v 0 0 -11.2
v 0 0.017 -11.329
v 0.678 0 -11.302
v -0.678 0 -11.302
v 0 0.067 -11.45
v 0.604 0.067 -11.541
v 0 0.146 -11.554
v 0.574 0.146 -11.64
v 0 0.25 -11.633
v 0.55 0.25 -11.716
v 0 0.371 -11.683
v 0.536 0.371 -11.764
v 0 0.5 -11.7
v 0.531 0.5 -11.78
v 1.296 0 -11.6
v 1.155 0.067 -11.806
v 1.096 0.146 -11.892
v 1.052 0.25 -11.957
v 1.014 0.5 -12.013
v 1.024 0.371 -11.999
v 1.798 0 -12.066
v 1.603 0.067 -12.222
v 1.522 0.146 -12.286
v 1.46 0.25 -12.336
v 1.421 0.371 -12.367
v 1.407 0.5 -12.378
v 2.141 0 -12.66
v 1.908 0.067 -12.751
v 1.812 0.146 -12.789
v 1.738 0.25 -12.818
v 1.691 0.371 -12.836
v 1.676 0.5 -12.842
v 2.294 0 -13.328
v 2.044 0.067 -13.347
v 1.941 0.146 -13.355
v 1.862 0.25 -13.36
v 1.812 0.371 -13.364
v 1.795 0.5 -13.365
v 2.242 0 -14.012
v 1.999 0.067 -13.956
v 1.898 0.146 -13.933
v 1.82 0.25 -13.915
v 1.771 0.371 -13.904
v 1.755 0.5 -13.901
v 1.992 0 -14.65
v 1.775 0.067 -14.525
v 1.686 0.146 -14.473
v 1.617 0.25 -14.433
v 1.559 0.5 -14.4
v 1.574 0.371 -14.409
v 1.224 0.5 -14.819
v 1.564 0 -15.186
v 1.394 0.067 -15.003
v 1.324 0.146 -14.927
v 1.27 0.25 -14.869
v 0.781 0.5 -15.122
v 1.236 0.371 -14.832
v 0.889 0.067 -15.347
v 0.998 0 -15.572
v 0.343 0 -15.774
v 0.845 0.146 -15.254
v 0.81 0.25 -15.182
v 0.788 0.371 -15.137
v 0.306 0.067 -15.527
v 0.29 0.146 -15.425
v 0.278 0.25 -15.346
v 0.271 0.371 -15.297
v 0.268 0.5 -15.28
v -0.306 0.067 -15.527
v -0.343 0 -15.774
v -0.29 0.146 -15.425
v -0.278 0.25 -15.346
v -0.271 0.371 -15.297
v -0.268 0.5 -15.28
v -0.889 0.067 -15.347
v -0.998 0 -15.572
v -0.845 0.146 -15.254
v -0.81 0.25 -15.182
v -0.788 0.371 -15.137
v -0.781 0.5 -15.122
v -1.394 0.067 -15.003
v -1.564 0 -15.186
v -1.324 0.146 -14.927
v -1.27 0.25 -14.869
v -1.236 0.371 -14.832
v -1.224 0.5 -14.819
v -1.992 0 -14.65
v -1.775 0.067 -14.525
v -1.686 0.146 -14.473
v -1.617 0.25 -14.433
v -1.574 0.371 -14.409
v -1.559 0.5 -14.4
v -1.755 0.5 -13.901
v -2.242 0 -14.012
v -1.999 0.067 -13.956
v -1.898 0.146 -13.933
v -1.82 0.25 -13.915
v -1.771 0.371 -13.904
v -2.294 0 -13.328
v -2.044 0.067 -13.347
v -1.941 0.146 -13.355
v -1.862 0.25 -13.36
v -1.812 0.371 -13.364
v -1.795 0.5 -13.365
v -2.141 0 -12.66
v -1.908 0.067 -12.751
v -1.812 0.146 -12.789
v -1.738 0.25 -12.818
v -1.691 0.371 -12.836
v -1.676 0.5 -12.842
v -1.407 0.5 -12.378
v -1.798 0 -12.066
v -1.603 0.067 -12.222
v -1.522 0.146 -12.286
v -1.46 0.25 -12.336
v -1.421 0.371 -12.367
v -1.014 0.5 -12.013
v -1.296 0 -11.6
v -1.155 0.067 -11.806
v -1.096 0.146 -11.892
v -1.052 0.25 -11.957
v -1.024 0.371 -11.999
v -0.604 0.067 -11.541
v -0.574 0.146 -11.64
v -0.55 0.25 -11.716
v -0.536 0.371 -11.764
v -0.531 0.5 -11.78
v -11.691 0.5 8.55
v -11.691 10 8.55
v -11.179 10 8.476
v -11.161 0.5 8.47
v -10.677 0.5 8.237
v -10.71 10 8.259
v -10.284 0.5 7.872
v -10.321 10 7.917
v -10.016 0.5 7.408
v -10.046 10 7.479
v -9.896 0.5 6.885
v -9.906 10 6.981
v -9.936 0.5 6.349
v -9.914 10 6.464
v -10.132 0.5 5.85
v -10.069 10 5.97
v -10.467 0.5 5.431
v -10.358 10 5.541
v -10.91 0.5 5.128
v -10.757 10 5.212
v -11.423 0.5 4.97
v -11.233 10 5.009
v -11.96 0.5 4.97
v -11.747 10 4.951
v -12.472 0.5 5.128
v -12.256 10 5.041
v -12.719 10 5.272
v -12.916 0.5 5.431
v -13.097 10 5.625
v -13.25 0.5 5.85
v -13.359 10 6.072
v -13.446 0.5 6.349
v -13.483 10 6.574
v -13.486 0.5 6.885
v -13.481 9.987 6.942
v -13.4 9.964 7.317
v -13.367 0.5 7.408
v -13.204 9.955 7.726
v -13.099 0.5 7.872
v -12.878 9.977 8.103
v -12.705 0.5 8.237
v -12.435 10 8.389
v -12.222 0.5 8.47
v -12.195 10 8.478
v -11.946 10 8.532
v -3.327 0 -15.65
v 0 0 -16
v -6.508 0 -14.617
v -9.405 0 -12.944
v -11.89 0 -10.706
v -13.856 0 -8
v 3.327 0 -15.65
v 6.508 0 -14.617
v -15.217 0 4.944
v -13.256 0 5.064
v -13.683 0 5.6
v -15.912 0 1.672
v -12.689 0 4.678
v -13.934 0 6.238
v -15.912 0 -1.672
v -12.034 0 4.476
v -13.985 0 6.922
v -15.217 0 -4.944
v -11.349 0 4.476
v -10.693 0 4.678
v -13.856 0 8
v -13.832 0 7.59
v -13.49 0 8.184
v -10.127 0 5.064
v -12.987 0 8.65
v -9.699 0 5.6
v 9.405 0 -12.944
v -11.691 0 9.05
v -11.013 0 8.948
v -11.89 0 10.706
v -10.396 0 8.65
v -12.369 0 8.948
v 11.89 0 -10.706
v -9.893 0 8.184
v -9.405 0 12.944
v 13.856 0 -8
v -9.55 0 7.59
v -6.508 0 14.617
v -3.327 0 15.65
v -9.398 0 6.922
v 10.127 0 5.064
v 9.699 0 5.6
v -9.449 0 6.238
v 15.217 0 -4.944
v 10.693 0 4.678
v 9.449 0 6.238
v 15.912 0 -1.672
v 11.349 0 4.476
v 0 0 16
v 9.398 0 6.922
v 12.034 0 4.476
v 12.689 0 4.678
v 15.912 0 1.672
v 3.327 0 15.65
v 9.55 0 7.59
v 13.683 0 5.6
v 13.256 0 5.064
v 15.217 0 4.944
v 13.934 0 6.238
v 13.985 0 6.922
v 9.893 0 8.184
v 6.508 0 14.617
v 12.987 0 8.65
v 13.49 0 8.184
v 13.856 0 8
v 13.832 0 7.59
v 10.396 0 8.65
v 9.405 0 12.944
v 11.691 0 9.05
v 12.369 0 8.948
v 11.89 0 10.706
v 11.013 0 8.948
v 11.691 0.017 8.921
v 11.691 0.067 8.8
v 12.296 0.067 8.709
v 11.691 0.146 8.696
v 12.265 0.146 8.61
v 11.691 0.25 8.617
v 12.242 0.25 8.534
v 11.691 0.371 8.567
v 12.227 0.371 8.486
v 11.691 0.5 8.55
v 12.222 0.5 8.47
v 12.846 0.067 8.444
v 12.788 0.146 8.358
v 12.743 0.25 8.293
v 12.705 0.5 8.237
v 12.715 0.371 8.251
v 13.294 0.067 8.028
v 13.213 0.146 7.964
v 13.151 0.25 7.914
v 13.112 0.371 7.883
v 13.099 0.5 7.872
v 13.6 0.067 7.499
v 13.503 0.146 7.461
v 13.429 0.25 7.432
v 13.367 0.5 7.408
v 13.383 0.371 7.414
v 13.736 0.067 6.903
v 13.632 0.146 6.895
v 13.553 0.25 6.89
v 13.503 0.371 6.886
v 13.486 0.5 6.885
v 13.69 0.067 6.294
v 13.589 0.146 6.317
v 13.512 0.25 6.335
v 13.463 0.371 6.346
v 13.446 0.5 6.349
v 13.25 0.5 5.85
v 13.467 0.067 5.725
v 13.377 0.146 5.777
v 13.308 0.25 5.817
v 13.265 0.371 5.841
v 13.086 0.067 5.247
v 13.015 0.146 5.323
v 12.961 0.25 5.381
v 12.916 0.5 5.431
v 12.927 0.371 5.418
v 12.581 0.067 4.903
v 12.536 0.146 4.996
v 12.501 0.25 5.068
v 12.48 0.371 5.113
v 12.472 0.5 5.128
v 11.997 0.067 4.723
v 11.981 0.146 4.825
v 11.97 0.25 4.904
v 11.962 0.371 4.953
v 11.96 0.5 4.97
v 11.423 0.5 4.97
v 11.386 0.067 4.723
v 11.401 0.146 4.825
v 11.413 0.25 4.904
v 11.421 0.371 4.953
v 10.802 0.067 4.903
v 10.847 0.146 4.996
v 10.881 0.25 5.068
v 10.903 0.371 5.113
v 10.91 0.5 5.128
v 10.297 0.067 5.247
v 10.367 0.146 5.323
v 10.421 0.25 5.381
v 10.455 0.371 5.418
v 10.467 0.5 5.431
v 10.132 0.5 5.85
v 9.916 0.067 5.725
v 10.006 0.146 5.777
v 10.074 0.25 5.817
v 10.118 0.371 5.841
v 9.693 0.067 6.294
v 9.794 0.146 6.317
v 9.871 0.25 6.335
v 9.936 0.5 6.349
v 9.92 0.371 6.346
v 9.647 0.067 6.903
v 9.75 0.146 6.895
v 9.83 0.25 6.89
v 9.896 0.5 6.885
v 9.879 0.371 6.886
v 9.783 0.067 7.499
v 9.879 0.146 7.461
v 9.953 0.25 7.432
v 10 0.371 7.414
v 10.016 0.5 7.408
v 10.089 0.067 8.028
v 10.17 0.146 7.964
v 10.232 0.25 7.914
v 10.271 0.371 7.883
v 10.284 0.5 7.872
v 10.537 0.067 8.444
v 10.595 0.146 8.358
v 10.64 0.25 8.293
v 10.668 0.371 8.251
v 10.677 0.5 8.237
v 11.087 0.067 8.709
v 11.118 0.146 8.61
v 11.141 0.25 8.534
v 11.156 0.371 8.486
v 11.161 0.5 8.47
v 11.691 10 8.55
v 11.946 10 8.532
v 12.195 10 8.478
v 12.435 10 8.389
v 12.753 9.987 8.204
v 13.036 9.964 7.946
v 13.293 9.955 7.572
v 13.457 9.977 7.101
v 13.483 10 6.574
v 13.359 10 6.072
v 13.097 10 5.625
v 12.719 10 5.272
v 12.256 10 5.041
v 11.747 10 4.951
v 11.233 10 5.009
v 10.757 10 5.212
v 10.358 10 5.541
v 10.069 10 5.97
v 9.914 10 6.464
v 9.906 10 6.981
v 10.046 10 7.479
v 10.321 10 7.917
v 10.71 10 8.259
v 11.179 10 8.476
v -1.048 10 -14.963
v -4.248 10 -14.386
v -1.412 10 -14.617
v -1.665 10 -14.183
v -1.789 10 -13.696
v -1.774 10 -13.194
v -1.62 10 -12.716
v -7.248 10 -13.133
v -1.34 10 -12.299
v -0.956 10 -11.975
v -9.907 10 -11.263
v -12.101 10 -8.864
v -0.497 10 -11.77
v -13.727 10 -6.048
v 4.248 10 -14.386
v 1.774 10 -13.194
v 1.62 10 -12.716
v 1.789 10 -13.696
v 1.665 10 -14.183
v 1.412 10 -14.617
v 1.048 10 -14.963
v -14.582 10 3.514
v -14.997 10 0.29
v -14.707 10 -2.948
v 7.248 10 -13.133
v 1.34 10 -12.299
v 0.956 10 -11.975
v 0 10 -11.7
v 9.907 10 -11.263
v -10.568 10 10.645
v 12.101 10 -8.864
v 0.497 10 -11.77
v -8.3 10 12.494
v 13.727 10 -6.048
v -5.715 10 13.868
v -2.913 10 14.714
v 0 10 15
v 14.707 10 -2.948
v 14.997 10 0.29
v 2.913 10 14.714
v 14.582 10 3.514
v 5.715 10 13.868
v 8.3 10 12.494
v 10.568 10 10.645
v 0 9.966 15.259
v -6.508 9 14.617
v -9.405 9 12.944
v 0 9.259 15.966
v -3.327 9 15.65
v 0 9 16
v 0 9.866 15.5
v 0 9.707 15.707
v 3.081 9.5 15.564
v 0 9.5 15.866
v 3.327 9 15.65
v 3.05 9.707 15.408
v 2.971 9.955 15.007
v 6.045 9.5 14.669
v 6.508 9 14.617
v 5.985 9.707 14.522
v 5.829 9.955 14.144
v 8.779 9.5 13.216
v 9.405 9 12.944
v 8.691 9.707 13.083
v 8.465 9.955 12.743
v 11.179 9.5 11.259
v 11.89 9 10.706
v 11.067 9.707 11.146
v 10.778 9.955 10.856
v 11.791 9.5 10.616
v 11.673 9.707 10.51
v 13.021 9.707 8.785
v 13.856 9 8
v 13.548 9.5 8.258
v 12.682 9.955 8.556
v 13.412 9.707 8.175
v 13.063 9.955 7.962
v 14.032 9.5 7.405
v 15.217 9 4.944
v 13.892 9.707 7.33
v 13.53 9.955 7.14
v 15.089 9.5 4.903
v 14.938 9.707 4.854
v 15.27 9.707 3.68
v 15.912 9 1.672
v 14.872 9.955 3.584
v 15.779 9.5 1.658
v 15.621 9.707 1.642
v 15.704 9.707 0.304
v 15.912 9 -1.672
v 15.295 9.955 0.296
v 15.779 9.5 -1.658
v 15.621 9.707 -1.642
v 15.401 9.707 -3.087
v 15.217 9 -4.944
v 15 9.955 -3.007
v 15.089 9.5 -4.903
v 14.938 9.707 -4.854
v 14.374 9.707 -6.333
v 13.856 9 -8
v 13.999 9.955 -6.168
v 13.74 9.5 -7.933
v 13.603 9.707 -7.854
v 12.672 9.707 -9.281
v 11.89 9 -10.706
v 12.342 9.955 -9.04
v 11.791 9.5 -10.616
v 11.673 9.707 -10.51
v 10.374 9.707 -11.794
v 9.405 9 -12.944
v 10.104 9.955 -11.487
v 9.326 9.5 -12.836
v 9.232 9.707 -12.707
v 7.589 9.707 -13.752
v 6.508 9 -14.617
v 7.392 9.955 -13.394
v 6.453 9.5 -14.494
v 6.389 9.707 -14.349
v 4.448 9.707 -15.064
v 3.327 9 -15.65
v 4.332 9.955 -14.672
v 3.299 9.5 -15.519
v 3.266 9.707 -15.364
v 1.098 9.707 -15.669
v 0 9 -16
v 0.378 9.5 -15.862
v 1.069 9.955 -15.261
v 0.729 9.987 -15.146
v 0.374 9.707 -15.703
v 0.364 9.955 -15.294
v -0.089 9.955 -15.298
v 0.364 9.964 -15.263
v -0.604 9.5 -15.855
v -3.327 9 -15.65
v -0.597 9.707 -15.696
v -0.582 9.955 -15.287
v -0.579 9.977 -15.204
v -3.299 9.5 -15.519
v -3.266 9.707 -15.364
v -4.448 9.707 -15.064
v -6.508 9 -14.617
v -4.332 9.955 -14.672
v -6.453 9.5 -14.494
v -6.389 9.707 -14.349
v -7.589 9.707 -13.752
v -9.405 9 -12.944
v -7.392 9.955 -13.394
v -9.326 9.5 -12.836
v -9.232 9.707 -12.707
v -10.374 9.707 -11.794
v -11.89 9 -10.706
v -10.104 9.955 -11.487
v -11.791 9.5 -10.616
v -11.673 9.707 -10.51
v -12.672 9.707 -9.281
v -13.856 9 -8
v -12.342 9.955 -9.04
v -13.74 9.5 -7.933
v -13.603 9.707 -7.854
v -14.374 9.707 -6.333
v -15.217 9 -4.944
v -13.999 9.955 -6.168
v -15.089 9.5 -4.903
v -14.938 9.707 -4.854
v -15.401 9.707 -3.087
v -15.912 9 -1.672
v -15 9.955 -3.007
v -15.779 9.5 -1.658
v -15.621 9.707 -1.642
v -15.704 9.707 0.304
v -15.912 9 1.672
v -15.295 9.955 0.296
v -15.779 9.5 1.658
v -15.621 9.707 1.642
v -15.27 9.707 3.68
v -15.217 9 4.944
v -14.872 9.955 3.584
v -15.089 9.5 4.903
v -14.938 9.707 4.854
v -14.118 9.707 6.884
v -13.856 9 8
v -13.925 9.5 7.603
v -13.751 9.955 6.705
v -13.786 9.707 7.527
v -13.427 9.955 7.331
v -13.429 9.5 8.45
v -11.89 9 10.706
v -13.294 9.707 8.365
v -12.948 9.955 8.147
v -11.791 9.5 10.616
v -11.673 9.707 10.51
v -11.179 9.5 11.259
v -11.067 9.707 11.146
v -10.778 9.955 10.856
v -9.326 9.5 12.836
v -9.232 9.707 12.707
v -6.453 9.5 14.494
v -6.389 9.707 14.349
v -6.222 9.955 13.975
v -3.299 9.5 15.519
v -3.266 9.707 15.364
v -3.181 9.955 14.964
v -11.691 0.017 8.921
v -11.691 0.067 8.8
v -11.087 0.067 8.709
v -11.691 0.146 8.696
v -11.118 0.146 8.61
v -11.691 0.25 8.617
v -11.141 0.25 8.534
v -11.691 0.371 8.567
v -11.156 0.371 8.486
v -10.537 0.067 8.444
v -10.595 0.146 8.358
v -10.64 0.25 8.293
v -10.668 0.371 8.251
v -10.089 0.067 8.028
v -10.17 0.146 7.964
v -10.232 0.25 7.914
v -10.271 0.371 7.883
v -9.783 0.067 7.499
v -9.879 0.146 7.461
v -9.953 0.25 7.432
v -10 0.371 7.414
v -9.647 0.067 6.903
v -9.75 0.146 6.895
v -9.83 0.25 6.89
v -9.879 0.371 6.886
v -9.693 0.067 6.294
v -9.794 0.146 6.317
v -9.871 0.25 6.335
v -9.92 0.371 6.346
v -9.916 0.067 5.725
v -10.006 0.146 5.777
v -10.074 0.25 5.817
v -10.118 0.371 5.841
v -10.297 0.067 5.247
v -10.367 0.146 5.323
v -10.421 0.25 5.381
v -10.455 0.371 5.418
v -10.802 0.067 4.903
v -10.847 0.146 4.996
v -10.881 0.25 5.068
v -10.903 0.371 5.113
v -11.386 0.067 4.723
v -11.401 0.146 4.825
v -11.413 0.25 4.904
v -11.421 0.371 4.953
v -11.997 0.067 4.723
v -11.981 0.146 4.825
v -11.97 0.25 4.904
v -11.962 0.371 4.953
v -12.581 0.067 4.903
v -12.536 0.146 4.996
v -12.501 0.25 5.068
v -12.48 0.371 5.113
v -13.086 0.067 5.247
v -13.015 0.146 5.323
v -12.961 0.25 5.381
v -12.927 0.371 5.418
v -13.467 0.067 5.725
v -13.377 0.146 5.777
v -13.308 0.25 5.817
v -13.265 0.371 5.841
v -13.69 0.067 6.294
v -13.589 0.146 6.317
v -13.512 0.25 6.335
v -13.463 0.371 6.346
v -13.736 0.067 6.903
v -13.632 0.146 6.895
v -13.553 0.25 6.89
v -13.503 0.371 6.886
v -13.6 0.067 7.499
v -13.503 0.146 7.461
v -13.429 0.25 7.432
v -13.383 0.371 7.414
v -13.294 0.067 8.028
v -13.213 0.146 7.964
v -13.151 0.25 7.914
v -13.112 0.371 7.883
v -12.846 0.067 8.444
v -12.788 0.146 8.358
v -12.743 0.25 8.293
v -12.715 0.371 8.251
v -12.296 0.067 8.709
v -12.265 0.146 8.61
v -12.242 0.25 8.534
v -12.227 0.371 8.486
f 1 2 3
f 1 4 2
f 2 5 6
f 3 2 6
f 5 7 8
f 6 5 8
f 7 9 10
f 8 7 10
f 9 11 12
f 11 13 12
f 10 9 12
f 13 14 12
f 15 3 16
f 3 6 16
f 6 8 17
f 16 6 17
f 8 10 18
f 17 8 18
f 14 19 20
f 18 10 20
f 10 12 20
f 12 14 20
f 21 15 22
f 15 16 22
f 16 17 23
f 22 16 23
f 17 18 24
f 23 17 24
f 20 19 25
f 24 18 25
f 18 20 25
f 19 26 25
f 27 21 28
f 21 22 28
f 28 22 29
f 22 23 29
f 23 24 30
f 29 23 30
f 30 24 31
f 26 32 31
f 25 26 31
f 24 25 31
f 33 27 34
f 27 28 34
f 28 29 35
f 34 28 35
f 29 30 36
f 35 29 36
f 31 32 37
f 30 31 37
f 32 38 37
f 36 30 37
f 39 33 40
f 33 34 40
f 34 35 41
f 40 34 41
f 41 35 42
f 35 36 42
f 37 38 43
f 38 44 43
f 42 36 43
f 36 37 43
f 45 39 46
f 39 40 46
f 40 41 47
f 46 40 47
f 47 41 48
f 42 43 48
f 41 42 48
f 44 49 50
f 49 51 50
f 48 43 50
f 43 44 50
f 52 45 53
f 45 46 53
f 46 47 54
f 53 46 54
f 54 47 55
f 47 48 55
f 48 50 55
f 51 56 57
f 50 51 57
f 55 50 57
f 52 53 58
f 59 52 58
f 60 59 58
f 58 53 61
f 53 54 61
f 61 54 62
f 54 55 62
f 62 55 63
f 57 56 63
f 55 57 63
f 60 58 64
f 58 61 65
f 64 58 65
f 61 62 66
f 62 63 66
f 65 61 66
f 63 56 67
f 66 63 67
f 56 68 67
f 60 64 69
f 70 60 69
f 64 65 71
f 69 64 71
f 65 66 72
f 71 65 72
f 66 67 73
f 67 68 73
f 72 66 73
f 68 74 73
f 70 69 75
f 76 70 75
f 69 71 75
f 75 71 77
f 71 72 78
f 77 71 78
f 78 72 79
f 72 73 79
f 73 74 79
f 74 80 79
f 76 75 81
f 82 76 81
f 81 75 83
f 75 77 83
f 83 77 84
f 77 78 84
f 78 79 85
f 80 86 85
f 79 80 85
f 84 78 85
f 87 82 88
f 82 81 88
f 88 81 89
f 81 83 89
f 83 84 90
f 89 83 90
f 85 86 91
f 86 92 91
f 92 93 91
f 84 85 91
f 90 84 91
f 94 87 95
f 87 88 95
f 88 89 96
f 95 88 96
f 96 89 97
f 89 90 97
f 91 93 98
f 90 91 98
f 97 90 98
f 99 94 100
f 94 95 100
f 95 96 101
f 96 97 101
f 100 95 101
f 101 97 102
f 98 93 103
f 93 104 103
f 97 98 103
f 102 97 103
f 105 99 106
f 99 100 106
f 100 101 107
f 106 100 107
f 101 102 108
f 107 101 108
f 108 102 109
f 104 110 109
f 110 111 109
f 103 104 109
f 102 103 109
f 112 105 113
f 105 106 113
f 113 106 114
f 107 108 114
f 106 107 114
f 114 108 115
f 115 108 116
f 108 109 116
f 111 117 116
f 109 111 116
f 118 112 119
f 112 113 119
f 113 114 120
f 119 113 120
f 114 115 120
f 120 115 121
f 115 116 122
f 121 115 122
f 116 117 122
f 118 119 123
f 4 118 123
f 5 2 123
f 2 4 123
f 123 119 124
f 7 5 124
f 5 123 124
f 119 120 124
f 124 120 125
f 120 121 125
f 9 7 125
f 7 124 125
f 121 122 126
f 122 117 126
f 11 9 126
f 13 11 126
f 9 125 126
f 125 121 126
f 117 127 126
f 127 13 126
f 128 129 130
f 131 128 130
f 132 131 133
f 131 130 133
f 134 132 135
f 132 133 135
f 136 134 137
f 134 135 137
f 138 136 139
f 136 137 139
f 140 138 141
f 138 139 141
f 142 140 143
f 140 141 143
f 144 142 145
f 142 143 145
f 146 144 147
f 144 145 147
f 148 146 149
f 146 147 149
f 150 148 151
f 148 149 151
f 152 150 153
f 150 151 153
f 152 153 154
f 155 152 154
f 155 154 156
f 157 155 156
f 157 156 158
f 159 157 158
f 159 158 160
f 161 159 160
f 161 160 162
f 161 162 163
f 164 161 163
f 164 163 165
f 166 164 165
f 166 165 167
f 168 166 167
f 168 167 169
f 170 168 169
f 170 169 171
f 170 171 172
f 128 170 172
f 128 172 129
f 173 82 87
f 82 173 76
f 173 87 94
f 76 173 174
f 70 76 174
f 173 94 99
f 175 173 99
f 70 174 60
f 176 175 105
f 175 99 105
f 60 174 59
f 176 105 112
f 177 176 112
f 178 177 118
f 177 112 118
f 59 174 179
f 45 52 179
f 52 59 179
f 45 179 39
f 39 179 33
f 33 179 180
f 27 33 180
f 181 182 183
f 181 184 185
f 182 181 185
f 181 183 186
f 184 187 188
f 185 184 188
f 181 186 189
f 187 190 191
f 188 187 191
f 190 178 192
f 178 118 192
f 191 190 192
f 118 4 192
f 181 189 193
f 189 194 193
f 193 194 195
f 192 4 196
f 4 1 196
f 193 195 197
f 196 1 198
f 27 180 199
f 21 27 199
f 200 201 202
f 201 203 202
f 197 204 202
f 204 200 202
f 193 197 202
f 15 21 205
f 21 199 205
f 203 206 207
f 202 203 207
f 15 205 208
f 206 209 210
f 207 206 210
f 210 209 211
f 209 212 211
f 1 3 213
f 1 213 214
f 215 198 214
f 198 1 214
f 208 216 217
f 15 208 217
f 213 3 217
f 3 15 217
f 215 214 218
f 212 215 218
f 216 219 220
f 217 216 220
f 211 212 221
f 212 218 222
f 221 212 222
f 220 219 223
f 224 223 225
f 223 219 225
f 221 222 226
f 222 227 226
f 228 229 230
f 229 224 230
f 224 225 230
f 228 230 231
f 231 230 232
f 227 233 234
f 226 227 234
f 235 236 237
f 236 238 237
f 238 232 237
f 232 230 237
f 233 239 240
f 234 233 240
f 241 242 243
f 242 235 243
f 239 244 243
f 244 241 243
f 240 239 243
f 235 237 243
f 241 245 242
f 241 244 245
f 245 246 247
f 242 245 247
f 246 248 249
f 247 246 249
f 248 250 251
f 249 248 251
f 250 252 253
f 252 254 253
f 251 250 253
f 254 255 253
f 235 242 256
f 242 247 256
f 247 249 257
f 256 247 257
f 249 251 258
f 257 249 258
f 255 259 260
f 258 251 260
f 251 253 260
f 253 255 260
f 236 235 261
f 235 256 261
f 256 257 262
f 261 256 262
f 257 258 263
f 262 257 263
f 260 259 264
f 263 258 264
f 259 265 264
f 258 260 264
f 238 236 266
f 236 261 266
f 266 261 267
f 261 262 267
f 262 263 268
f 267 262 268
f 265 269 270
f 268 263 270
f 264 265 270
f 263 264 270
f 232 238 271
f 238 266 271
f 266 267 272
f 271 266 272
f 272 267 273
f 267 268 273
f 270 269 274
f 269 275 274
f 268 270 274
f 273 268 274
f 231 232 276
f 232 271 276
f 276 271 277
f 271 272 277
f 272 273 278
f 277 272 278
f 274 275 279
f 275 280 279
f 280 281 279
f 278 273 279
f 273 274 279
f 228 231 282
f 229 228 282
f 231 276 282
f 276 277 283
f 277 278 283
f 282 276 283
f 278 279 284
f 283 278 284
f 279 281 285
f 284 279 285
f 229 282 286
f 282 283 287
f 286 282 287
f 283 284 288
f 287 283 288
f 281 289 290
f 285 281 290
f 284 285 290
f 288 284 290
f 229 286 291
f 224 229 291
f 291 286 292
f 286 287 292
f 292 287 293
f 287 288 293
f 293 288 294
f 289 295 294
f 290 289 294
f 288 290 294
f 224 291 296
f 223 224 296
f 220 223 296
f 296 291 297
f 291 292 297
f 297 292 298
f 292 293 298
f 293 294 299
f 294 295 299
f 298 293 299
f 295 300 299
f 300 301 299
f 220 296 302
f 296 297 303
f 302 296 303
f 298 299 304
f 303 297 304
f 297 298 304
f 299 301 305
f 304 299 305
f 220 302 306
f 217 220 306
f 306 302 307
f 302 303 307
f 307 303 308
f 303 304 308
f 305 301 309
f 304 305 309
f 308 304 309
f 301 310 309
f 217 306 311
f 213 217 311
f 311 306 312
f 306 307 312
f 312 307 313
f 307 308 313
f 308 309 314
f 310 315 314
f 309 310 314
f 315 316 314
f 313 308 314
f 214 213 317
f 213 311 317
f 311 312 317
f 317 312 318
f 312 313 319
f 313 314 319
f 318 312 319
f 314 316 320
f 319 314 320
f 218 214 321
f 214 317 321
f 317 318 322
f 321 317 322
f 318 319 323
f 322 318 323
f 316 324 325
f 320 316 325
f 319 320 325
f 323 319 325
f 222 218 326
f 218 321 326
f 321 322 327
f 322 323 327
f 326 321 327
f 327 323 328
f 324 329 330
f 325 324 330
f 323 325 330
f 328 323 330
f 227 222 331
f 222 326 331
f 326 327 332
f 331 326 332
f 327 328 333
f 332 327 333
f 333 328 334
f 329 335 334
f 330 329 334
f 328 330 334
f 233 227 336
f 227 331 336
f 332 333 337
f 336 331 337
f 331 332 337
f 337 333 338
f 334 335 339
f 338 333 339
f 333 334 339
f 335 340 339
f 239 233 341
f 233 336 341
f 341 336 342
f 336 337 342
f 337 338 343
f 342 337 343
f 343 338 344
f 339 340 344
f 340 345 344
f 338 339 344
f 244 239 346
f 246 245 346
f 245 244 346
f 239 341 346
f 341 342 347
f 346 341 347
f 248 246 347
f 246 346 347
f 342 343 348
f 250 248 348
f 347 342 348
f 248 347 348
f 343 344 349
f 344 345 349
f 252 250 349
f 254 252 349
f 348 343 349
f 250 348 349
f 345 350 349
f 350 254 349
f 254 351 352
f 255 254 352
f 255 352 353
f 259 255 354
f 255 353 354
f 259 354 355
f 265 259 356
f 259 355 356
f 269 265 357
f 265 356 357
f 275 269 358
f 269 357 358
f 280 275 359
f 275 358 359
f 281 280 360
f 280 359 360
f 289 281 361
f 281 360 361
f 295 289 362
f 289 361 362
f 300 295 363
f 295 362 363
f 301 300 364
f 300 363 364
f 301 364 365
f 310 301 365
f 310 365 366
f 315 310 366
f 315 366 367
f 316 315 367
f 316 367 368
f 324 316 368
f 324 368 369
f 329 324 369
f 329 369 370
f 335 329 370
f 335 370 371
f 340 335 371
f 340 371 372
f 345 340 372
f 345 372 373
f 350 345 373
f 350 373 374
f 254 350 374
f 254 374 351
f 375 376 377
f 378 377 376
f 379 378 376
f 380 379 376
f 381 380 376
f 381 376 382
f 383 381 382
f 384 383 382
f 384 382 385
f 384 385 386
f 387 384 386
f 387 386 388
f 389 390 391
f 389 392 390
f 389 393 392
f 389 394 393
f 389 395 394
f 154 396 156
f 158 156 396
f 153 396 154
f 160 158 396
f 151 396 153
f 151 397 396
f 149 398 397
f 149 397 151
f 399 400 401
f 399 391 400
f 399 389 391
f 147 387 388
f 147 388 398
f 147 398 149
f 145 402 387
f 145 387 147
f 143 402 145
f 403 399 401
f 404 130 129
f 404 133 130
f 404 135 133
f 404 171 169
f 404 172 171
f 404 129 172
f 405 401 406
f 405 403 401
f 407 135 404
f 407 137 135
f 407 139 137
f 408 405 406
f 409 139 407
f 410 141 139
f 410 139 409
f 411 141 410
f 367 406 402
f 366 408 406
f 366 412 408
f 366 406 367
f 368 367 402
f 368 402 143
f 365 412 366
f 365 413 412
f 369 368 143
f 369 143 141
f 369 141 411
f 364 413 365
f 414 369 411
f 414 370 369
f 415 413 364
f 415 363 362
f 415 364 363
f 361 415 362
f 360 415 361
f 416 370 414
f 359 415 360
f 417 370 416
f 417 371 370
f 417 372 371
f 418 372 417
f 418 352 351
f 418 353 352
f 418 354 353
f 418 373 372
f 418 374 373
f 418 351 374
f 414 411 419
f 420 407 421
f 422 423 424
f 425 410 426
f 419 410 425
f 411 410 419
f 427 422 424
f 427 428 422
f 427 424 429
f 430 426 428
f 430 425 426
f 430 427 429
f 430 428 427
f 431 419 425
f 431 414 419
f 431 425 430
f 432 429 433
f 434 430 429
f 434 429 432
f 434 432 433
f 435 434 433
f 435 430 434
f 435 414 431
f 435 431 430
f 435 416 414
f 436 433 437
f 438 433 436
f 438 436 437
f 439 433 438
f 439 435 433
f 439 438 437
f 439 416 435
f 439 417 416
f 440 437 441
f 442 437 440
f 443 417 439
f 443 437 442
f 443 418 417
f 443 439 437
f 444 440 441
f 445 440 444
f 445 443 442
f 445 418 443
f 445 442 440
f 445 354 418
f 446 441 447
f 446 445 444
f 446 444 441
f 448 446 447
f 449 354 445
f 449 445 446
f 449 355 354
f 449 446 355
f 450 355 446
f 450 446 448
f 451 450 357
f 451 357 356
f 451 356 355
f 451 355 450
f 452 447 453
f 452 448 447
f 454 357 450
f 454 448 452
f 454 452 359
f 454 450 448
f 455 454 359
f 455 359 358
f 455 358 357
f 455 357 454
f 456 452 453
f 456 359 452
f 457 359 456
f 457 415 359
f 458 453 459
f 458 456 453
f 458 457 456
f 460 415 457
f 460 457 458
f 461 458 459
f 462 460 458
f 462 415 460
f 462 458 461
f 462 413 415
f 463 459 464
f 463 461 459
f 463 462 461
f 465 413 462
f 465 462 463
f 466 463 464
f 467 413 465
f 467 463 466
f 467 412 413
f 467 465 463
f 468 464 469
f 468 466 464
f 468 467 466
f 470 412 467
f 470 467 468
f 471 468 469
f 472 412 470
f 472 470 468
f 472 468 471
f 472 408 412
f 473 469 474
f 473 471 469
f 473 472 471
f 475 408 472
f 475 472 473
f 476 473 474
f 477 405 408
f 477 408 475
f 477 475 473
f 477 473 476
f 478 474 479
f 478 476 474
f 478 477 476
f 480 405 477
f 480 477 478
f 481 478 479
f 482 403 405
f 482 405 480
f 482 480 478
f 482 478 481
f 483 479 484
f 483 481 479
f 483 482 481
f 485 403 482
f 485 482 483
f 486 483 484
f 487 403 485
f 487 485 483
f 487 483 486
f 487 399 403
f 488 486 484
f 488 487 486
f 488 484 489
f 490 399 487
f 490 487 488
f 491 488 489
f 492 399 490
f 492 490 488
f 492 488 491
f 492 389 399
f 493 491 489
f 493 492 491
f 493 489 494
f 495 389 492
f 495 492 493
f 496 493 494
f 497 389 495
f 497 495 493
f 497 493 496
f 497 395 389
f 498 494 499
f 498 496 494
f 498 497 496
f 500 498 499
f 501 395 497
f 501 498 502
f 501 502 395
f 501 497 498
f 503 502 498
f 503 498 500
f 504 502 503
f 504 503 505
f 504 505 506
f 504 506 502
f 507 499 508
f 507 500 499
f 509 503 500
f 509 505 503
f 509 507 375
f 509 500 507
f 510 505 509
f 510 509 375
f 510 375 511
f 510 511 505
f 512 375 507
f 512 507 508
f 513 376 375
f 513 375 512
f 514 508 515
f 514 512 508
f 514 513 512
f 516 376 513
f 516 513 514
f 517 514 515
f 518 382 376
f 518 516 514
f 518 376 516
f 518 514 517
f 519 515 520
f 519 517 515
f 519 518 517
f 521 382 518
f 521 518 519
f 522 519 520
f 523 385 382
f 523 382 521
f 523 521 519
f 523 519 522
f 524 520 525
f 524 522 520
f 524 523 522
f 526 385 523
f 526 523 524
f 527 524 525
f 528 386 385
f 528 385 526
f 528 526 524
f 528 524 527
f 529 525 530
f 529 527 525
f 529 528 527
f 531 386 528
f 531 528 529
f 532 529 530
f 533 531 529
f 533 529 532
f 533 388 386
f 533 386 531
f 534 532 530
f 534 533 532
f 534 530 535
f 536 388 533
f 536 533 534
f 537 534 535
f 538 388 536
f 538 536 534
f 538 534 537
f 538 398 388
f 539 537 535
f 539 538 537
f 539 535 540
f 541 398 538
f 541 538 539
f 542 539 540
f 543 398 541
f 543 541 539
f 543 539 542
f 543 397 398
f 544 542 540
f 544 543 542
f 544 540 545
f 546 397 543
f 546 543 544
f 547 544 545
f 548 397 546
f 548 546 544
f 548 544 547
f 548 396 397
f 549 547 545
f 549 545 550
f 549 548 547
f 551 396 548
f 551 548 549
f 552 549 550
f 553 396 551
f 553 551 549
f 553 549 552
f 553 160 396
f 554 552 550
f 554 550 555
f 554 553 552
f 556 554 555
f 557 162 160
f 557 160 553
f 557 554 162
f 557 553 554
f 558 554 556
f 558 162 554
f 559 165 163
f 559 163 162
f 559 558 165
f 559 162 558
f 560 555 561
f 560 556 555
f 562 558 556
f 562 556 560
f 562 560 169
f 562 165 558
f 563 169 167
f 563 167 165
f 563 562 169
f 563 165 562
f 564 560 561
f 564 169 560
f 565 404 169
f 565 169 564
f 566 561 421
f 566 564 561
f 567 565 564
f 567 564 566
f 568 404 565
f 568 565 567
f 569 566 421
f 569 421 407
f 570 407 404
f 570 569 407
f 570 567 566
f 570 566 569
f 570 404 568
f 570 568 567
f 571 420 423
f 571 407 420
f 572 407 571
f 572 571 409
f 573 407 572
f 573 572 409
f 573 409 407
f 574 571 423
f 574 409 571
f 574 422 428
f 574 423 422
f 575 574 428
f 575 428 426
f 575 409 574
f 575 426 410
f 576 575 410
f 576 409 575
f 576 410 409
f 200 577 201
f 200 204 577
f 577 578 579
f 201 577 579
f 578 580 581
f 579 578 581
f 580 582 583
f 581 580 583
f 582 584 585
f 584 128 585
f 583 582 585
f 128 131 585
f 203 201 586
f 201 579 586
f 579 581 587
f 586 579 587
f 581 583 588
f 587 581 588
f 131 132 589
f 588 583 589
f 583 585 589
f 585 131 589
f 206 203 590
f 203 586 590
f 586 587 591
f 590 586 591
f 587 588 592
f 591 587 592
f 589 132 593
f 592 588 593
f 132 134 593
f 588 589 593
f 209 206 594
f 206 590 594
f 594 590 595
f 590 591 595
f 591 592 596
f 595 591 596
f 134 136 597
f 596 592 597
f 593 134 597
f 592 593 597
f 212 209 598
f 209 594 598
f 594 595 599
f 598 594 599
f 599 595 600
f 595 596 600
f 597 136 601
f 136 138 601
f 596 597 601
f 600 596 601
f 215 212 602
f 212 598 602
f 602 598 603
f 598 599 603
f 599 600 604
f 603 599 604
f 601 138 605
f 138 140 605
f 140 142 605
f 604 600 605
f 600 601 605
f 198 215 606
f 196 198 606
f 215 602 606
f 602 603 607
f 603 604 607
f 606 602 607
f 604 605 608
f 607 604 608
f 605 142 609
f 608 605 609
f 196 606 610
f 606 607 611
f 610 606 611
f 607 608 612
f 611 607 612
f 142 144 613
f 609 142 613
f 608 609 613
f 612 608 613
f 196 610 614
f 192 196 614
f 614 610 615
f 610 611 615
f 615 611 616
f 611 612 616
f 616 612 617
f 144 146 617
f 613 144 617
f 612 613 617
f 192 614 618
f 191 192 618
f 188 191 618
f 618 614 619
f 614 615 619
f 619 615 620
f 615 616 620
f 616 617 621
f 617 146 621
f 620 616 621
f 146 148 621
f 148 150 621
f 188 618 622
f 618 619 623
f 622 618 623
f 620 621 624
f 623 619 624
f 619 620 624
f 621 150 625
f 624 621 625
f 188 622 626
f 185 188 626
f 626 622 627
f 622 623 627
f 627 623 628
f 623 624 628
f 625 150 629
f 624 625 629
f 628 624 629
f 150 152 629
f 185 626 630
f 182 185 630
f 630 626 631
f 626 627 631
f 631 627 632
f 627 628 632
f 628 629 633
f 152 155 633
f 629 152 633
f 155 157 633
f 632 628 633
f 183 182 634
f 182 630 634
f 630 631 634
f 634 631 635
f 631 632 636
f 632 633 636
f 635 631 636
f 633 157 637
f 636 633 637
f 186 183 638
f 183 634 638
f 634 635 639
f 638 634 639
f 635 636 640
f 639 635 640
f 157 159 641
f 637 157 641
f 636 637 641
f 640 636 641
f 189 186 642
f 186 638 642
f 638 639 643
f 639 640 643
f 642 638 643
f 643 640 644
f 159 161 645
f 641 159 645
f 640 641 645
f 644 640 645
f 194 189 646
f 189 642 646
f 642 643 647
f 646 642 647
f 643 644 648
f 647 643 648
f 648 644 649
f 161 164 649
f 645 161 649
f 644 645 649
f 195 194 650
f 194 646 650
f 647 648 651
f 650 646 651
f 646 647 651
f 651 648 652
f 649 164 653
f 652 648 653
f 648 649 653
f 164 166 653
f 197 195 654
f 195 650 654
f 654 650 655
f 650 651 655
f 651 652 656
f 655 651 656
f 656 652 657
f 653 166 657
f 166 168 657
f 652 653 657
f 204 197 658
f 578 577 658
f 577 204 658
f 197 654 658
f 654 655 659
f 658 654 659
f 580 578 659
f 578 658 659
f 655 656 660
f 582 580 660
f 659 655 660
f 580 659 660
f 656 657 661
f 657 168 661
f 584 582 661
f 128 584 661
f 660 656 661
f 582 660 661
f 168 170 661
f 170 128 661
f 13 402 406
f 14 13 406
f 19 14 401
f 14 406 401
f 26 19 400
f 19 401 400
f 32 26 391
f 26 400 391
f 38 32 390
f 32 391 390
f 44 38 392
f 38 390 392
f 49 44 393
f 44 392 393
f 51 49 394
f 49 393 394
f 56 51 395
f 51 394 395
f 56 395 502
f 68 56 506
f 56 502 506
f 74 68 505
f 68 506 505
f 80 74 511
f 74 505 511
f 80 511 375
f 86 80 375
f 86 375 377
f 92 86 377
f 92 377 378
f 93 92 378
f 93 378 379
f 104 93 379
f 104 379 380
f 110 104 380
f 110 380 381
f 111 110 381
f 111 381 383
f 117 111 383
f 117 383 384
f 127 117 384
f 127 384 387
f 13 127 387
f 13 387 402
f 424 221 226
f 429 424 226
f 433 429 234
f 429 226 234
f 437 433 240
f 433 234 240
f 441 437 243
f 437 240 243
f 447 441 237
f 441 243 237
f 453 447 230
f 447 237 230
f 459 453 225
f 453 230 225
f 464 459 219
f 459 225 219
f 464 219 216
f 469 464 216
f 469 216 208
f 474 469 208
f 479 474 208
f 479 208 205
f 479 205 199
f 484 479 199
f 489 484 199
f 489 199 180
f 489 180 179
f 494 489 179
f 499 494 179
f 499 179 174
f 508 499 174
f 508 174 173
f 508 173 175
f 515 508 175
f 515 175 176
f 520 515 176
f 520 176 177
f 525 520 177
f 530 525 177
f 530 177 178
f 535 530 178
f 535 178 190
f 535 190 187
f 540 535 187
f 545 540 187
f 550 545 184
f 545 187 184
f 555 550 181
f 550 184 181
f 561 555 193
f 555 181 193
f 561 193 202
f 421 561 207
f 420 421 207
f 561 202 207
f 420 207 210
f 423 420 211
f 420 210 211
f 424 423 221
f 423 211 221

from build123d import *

# Parameters (mm, degrees)
SKETCH_1_R          = 16
EXTRUDE_1_DEPTH     = 10
SKETCH_2_R          = 1.8
CUT_EXTRUDE_1_DEPTH = 20
FILLET_1_R          = 1
FILLET_2_R          = 0.5


with BuildPart() as part:
    # Эскиз1 → Бобышка-Вытянуть1 (new body)
    with BuildSketch(Plane(origin=(0, 0, 0), x_dir=(1, 0, 0), z_dir=(0, 1, 0))):
        with Locations(Location((0, 0, 0), (0, 0, 270))):
            Circle(SKETCH_1_R)
    extrude(amount=EXTRUDE_1_DEPTH)

    # Эскиз2 → Вырез-Вытянуть1 (cut)
    with BuildSketch(Plane(origin=(0, 10, 0), x_dir=(1, 0, 0), z_dir=(0, 1, 0))):
        with Locations(Location((0, 13.5, 0), (0, 0, 270))):
            Circle(SKETCH_2_R)
        with Locations(Location((11.691342951, -6.75, 0), (0, 0, 270))):
            Circle(SKETCH_2_R)
        with Locations(Location((-11.691342951, -6.75, 0), (0, 0, 270))):
            Circle(SKETCH_2_R)
    extrude(amount=-CUT_EXTRUDE_1_DEPTH, mode=Mode.SUBTRACT)

    # Скругление1
    # the kernel refuses this fillet: 1 mm, written as the material it takes off along each edge
    with BuildSketch(Plane(origin=(0, 10, 0), x_dir=(0, 0, 1), z_dir=(-1, 0, 0))) as fillet_1_piece_1:
        with BuildLine():
            CenterArc((16 - FILLET_1_R, -FILLET_1_R), FILLET_1_R, 0, 90)
            Line((16 - FILLET_1_R, 0), (16, 0))
            Line((16, 0), (16, -FILLET_1_R))
        make_face()
    revolve(axis=Axis((0, 10, 0), (0, 1, 0)), mode=Mode.SUBTRACT)

    # Скругление2
    fillet_2_edges = [part.edges().sort_by_distance(p)[0] for p in [
        (11.691342951, 0, 4.95),
        (-11.691342951, 0, 4.95),
        (0, 0, -15.3),
    ]]
    fillet(fillet_2_edges, radius=FILLET_2_R)


solid = part.part
